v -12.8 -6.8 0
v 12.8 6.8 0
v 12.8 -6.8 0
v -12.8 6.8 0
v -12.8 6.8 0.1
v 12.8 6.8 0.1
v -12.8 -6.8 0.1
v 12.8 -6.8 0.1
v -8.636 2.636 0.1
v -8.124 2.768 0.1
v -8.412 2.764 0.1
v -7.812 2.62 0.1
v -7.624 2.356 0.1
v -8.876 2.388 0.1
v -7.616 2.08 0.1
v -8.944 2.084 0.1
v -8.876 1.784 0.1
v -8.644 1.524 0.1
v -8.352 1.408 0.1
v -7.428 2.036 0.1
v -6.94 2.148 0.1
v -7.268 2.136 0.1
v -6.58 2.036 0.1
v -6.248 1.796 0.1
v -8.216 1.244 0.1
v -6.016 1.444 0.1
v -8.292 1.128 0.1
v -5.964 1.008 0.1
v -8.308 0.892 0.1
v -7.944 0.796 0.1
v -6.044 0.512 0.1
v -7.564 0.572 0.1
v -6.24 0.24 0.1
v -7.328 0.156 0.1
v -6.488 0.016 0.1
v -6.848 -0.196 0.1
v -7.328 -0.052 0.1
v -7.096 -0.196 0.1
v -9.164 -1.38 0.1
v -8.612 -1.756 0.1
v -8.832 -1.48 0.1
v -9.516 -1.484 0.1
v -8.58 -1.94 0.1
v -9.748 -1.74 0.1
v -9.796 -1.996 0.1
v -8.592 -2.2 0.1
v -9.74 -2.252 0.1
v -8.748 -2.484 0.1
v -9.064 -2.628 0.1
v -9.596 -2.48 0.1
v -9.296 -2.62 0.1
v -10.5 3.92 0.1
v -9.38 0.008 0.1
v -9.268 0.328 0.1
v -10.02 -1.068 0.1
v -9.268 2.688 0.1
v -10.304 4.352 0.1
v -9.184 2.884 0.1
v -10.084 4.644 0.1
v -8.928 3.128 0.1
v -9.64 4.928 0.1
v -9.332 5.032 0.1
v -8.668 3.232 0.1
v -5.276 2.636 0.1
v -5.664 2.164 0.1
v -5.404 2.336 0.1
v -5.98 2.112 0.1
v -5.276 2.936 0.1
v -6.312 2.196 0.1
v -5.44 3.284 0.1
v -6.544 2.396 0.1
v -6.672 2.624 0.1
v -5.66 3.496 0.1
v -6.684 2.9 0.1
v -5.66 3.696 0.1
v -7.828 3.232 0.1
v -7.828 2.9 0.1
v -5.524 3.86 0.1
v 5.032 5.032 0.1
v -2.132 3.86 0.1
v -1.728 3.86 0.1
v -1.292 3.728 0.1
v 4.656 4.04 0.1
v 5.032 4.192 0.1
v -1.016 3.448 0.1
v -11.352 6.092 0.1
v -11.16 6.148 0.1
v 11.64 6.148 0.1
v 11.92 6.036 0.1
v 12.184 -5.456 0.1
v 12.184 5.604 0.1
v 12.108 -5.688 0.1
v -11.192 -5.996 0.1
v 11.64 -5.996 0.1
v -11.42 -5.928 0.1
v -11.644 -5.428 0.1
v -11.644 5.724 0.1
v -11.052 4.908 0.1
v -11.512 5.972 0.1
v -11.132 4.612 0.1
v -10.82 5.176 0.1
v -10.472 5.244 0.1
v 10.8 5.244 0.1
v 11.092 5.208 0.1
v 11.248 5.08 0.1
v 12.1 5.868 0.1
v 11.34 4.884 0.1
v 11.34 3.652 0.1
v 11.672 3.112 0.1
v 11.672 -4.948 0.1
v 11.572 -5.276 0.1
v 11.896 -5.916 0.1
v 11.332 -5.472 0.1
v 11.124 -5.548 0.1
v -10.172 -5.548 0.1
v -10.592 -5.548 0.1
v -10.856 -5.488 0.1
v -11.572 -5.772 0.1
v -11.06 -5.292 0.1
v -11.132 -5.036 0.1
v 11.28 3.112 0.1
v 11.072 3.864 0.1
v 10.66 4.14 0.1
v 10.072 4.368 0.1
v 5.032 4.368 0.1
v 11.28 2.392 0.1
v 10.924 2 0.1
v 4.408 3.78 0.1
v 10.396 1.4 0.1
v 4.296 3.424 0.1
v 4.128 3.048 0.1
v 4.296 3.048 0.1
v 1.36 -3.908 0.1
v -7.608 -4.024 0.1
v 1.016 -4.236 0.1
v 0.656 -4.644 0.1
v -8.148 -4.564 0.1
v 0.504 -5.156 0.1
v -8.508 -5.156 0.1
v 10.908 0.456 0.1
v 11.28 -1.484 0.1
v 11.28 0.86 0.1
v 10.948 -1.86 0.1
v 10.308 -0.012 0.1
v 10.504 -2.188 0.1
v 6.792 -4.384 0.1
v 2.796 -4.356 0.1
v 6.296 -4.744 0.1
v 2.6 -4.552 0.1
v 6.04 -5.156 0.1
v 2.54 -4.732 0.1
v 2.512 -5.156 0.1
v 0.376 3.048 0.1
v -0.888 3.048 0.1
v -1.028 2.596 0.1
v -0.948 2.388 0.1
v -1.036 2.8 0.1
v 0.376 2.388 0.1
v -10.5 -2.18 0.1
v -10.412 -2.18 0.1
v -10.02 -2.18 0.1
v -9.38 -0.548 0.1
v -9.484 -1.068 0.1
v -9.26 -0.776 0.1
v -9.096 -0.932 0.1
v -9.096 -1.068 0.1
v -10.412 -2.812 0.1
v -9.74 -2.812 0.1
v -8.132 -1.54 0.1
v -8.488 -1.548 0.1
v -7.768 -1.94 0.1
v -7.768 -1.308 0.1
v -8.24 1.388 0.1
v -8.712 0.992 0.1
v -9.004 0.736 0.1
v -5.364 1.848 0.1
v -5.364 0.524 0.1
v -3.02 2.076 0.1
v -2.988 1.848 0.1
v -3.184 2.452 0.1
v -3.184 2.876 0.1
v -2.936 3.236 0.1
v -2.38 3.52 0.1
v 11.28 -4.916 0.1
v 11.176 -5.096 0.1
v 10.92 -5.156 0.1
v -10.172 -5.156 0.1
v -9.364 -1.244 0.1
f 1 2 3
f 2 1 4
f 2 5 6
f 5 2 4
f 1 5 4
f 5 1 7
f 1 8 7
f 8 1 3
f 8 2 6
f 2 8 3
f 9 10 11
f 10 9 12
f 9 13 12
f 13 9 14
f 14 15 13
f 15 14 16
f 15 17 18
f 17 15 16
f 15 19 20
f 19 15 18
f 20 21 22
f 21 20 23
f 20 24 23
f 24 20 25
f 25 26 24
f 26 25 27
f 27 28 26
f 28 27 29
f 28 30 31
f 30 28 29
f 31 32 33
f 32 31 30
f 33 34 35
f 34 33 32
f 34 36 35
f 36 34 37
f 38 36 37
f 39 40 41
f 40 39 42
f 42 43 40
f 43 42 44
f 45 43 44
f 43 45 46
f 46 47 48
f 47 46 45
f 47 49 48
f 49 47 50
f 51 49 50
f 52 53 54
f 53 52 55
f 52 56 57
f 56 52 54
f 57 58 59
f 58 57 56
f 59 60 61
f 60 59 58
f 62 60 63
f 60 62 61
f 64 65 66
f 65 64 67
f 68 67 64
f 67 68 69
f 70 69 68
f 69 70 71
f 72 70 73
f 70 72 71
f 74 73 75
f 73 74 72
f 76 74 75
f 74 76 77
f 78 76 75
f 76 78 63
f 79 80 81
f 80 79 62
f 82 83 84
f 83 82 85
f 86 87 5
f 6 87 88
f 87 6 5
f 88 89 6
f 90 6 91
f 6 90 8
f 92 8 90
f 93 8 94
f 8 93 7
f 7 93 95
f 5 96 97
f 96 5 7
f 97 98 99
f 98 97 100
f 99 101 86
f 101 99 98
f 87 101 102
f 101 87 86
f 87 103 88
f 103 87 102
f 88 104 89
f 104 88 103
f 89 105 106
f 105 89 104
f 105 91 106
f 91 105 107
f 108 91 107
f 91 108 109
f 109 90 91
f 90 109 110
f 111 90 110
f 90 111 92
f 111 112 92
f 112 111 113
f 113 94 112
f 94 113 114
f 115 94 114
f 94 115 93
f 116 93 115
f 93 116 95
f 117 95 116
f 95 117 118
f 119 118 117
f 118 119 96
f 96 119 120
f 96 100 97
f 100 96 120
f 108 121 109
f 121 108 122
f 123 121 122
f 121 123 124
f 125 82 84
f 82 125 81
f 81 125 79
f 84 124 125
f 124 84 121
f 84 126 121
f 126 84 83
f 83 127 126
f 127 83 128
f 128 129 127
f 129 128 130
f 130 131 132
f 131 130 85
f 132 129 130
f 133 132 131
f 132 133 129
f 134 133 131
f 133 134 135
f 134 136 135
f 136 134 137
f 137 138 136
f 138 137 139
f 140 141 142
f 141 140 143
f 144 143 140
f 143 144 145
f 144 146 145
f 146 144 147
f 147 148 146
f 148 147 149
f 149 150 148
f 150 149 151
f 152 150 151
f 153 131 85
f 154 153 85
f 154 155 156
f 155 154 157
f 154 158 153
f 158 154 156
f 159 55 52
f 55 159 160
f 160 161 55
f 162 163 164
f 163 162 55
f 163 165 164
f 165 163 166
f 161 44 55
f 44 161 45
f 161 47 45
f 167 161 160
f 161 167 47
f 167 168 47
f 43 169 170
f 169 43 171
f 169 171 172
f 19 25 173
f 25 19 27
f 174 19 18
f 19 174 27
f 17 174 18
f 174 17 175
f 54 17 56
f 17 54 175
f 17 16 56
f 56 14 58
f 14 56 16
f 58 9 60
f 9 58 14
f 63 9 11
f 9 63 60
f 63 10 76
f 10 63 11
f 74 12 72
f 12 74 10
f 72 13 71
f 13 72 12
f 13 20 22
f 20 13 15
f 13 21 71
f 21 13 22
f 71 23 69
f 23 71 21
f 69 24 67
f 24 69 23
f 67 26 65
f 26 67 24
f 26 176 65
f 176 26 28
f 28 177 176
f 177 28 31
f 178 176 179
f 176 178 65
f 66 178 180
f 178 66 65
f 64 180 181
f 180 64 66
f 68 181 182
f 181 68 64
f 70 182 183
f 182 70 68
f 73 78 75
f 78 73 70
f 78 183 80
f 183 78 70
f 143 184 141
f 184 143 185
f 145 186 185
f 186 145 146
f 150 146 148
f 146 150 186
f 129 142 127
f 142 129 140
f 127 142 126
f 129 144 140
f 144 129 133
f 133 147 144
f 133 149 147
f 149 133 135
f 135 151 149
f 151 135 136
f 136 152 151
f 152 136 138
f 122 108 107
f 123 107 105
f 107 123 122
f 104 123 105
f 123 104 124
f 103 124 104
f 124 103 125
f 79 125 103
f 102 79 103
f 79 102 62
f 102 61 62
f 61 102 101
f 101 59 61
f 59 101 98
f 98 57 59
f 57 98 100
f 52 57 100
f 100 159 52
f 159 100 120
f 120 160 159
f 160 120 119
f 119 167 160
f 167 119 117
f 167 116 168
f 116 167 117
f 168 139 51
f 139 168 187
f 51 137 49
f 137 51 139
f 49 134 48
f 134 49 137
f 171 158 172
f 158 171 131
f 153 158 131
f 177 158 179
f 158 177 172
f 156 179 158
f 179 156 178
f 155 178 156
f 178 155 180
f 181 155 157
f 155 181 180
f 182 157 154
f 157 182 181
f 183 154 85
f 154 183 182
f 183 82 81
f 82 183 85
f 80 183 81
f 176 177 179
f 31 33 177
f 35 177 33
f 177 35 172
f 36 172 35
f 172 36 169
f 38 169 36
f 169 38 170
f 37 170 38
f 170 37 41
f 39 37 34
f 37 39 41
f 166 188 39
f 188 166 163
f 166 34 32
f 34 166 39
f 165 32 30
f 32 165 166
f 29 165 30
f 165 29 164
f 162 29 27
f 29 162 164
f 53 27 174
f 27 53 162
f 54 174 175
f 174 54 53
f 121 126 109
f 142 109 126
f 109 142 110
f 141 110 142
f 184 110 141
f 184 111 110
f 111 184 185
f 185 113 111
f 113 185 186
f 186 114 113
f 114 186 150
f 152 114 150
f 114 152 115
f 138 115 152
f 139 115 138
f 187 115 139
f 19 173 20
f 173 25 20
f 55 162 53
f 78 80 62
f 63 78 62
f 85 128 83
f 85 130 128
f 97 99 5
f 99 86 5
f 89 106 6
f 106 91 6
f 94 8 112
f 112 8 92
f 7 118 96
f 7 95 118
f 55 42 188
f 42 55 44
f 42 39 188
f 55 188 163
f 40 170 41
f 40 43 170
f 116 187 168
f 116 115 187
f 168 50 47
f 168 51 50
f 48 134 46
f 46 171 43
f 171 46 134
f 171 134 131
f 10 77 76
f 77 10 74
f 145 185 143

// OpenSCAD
// file: ../p/box5-12.scad
use <../lib.scad>
function ldraw_lib__box5_12() = [
// 0 Box with 5 Faces without Any Edges
// 0 Name: box5-12.dat
// 0 Author: Chris Dee [cwdee]
// 0 !LDRAW_ORG Primitive UPDATE 2009-02
// 0 !LICENSE Licensed under CC BY 2.0 and CC BY 4.0 : see CAreadme.txt
// 
// 0 BFC CERTIFY CCW
  [0,"BFC","CERTIFY"],
  [0,"BFC","CCW"],
// 
// 0 !HISTORY 2009-09-03 [PTadmin] Official Update 2009-02
// 
// 
// 4 16 1 1 1 1 1 -1 -1 1 -1 -1 1 1
  [4,16,1,1,1,1,1,-1,-1,1,-1,-1,1,1],
// 4 16 -1 0 1 1 0 1 1 1 1 -1 1 1
  [4,16,-1,0,1,1,0,1,1,1,1,-1,1,1],
// 4 16 -1 0 -1 -1 0 1 -1 1 1 -1 1 -1
  [4,16,-1,0,-1,-1,0,1,-1,1,1,-1,1,-1],
// 4 16 1 0 -1 -1 0 -1 -1 1 -1 1 1 -1
  [4,16,1,0,-1,-1,0,-1,-1,1,-1,1,1,-1],
// 4 16 1 0 1 1 0 -1 1 1 -1 1 1 1
  [4,16,1,0,1,1,0,-1,1,1,-1,1,1,1],
// 0
];
makepoly(ldraw_lib__box5_12(), line=0.2);
// main file
use <../lib.scad>
use <../p/box5-12.scad>
function ldraw_lib__168315e() = [
// 0 Sticker  1.7 x  3.2 Technic Supercar Mirror
// 0 Name: 168315e.dat
// 0 Author: Imre Papp [ampi]
// 0 !LDRAW_ORG Part UPDATE 2012-03
// 0 !LICENSE Licensed under CC BY 2.0 and CC BY 4.0 : see CAreadme.txt
// 
// 0 BFC CERTIFY CW
  [0,"BFC","CERTIFY"],
  [0,"BFC","CW"],
// 
// 0 !HISTORY 2005-12-28 [PTadmin] Official Update 2005-01
// 0 !HISTORY 2007-05-05 [PTadmin] Header formatted for Contributor Agreement
// 0 !HISTORY 2008-07-01 [PTadmin] Official Update 2008-01
// 0 !HISTORY 2012-01-08 [cwdee] Renamed from 168135e, add dimensions
// 0 !HISTORY 2012-11-01 [MagFors] Closed small gaps
// 0 !HISTORY 2012-12-28 [PTadmin] Official Update 2012-03
// 
// 
// 1 0 0 -0.25 0 32 0 0 0 0.25 0 0 0 17 box5-12.dat
  [1,0,0,-0.25,0,32,0,0,0,0.25,0,0,0,17, ldraw_lib__box5_12()],
// 0 // sticker pattern
// 4 0 -21.03 -0.25 6.91 -20.31 -0.25 6.92 -19.53 -0.25 6.55 -21.59 -0.25 6.59
  [4,0,-21.03,-0.25,6.91,-20.31,-0.25,6.92,-19.53,-0.25,6.55,-21.59,-0.25,6.59],
// 4 0 -21.59 -0.25 6.59 -19.53 -0.25 6.55 -19.06 -0.25 5.89 -22.19 -0.25 5.97
  [4,0,-21.59,-0.25,6.59,-19.53,-0.25,6.55,-19.06,-0.25,5.89,-22.19,-0.25,5.97],
// 4 0 -22.19 -0.25 5.97 -19.06 -0.25 5.89 -19.04 -0.25 5.2 -22.36 -0.25 5.21
  [4,0,-22.19,-0.25,5.97,-19.06,-0.25,5.89,-19.04,-0.25,5.2,-22.36,-0.25,5.21],
// 4 0 -22.36 -0.25 5.21 -19.04 -0.25 5.2 -21.61 -0.25 3.81 -22.19 -0.25 4.46
  [4,0,-22.36,-0.25,5.21,-19.04,-0.25,5.2,-21.61,-0.25,3.81,-22.19,-0.25,4.46],
// 4 0 -21.61 -0.25 3.81 -19.04 -0.25 5.2 -18.57 -0.25 5.09 -20.88 -0.25 3.52
  [4,0,-21.61,-0.25,3.81,-19.04,-0.25,5.2,-18.57,-0.25,5.09,-20.88,-0.25,3.52],
// 4 0 -18.57 -0.25 5.09 -18.17 -0.25 5.34 -17.35 -0.25 5.37 -16.45 -0.25 5.09
  [4,0,-18.57,-0.25,5.09,-18.17,-0.25,5.34,-17.35,-0.25,5.37,-16.45,-0.25,5.09],
// 4 0 -18.57 -0.25 5.09 -16.45 -0.25 5.09 -15.62 -0.25 4.49 -20.54 -0.25 3.11
  [4,0,-18.57,-0.25,5.09,-16.45,-0.25,5.09,-15.62,-0.25,4.49,-20.54,-0.25,3.11],
// 4 0 -20.54 -0.25 3.11 -15.62 -0.25 4.49 -15.04 -0.25 3.61 -20.73 -0.25 2.82
  [4,0,-20.54,-0.25,3.11,-15.62,-0.25,4.49,-15.04,-0.25,3.61,-20.73,-0.25,2.82],
// 4 0 -20.73 -0.25 2.82 -15.04 -0.25 3.61 -14.91 -0.25 2.52 -20.77 -0.25 2.23
  [4,0,-20.73,-0.25,2.82,-15.04,-0.25,3.61,-14.91,-0.25,2.52,-20.77,-0.25,2.23],
// 4 0 -20.77 -0.25 2.23 -14.91 -0.25 2.52 -15.11 -0.25 1.28 -19.86 -0.25 1.99
  [4,0,-20.77,-0.25,2.23,-14.91,-0.25,2.52,-15.11,-0.25,1.28,-19.86,-0.25,1.99],
// 4 0 -19.86 -0.25 1.99 -15.11 -0.25 1.28 -15.6 -0.25 0.6 -18.91 -0.25 1.43
  [4,0,-19.86,-0.25,1.99,-15.11,-0.25,1.28,-15.6,-0.25,0.6,-18.91,-0.25,1.43],
// 4 0 -18.91 -0.25 1.43 -15.6 -0.25 0.6 -16.22 -0.25 0.04 -18.32 -0.25 0.39
  [4,0,-18.91,-0.25,1.43,-15.6,-0.25,0.6,-16.22,-0.25,0.04,-18.32,-0.25,0.39],
// 4 0 -18.32 -0.25 -0.13 -18.32 -0.25 0.39 -16.22 -0.25 0.04 -17.12 -0.25 -0.49
  [4,0,-18.32,-0.25,-0.13,-18.32,-0.25,0.39,-16.22,-0.25,0.04,-17.12,-0.25,-0.49],
// 3 0 -18.32 -0.25 -0.13 -17.12 -0.25 -0.49 -17.74 -0.25 -0.49
  [3,0,-18.32,-0.25,-0.13,-17.12,-0.25,-0.49,-17.74,-0.25,-0.49],
// 4 0 -22.91 -0.25 -3.45 -22.08 -0.25 -3.7 -21.53 -0.25 -4.39 -23.79 -0.25 -3.71
  [4,0,-22.91,-0.25,-3.45,-22.08,-0.25,-3.7,-21.53,-0.25,-4.39,-23.79,-0.25,-3.71],
// 4 0 -23.79 -0.25 -3.71 -21.53 -0.25 -4.39 -21.45 -0.25 -4.85 -24.37 -0.25 -4.35
  [4,0,-23.79,-0.25,-3.71,-21.53,-0.25,-4.39,-21.45,-0.25,-4.85,-24.37,-0.25,-4.35],
// 4 0 -24.37 -0.25 -4.35 -21.45 -0.25 -4.85 -21.48 -0.25 -5.5 -24.49 -0.25 -4.99
  [4,0,-24.37,-0.25,-4.35,-21.45,-0.25,-4.85,-21.48,-0.25,-5.5,-24.49,-0.25,-4.99],
// 4 0 -24.49 -0.25 -4.99 -21.48 -0.25 -5.5 -21.87 -0.25 -6.21 -24.35 -0.25 -5.63
  [4,0,-24.49,-0.25,-4.99,-21.48,-0.25,-5.5,-21.87,-0.25,-6.21,-24.35,-0.25,-5.63],
// 4 0 -23.99 -0.25 -6.2 -24.35 -0.25 -5.63 -21.87 -0.25 -6.21 -22.66 -0.25 -6.57
  [4,0,-23.99,-0.25,-6.2,-24.35,-0.25,-5.63,-21.87,-0.25,-6.21,-22.66,-0.25,-6.57],
// 3 0 -23.99 -0.25 -6.2 -22.66 -0.25 -6.57 -23.24 -0.25 -6.55
  [3,0,-23.99,-0.25,-6.2,-22.66,-0.25,-6.57,-23.24,-0.25,-6.55],
// 4 0 -26.25 -0.25 9.8 -23.17 -0.25 0.82 -23.45 -0.25 0.02 -25.05 -0.25 -2.67
  [4,0,-26.25,-0.25,9.8,-23.17,-0.25,0.82,-23.45,-0.25,0.02,-25.05,-0.25,-2.67],
// 4 0 -26.25 -0.25 9.8 -25.76 -0.25 10.88 -23.17 -0.25 6.72 -23.17 -0.25 0.82
  [4,0,-26.25,-0.25,9.8,-25.76,-0.25,10.88,-23.17,-0.25,6.72,-23.17,-0.25,0.82],
// 4 0 -25.76 -0.25 10.88 -25.21 -0.25 11.61 -22.96 -0.25 7.21 -23.17 -0.25 6.72
  [4,0,-25.76,-0.25,10.88,-25.21,-0.25,11.61,-22.96,-0.25,7.21,-23.17,-0.25,6.72],
// 4 0 -25.21 -0.25 11.61 -24.1 -0.25 12.32 -22.32 -0.25 7.82 -22.96 -0.25 7.21
  [4,0,-25.21,-0.25,11.61,-24.1,-0.25,12.32,-22.32,-0.25,7.82,-22.96,-0.25,7.21],
// 4 0 -24.1 -0.25 12.32 -23.33 -0.25 12.58 -21.67 -0.25 8.08 -22.32 -0.25 7.82
  [4,0,-24.1,-0.25,12.32,-23.33,-0.25,12.58,-21.67,-0.25,8.08,-22.32,-0.25,7.82],
// 4 0 -14.95 -0.25 5.28 -13.19 -0.25 6.59 -13.51 -0.25 5.84 -14.16 -0.25 5.41
  [4,0,-14.95,-0.25,5.28,-13.19,-0.25,6.59,-13.51,-0.25,5.84,-14.16,-0.25,5.41],
// 4 0 -15.78 -0.25 5.49 -13.19 -0.25 7.34 -13.19 -0.25 6.59 -14.95 -0.25 5.28
  [4,0,-15.78,-0.25,5.49,-13.19,-0.25,7.34,-13.19,-0.25,6.59,-14.95,-0.25,5.28],
// 4 0 -16.36 -0.25 5.99 -13.6 -0.25 8.21 -13.19 -0.25 7.34 -15.78 -0.25 5.49
  [4,0,-16.36,-0.25,5.99,-13.6,-0.25,8.21,-13.19,-0.25,7.34,-15.78,-0.25,5.49],
// 4 0 -16.68 -0.25 6.56 -14.15 -0.25 8.74 -13.6 -0.25 8.21 -16.36 -0.25 5.99
  [4,0,-16.68,-0.25,6.56,-14.15,-0.25,8.74,-13.6,-0.25,8.21,-16.36,-0.25,5.99],
// 4 0 -16.71 -0.25 7.25 -14.15 -0.25 9.24 -14.15 -0.25 8.74 -16.68 -0.25 6.56
  [4,0,-16.71,-0.25,7.25,-14.15,-0.25,9.24,-14.15,-0.25,8.74,-16.68,-0.25,6.56],
// 4 0 -19.57 -0.25 8.08 -14.15 -0.25 9.24 -16.71 -0.25 7.25 -19.57 -0.25 7.25
  [4,0,-19.57,-0.25,8.08,-14.15,-0.25,9.24,-16.71,-0.25,7.25,-19.57,-0.25,7.25],
// 4 0 -21.67 -0.25 8.08 -13.81 -0.25 9.65 -14.15 -0.25 9.24 -19.57 -0.25 8.08
  [4,0,-21.67,-0.25,8.08,-13.81,-0.25,9.65,-14.15,-0.25,9.24,-19.57,-0.25,8.08],
// 4 0 -23.33 -0.25 12.58 12.58 -0.25 12.58 -4.32 -0.25 9.65 -5.33 -0.25 9.65
  [4,0,-23.33,-0.25,12.58,12.58,-0.25,12.58,-4.32,-0.25,9.65,-5.33,-0.25,9.65],
// 4 0 -3.23 -0.25 9.32 12.58 -0.25 10.48 11.64 -0.25 10.1 -2.54 -0.25 8.62
  [4,0,-3.23,-0.25,9.32,12.58,-0.25,10.48,11.64,-0.25,10.1,-2.54,-0.25,8.62],
// 3 0 -32 -0.25 17 -27.9 -0.25 15.37 -28.38 -0.25 15.23
  [3,0,-32,-0.25,17,-27.9,-0.25,15.37,-28.38,-0.25,15.23],
// 4 0 -32 -0.25 17 32 -0.25 17 29.1 -0.25 15.37 -27.9 -0.25 15.37
  [4,0,-32,-0.25,17,32,-0.25,17,29.1,-0.25,15.37,-27.9,-0.25,15.37],
// 3 0 32 -0.25 17 29.8 -0.25 15.09 29.1 -0.25 15.37
  [3,0,32,-0.25,17,29.8,-0.25,15.09,29.1,-0.25,15.37],
// 4 0 30.46 -0.25 14.01 32 -0.25 17 32 -0.25 -17 30.46 -0.25 -13.64
  [4,0,30.46,-0.25,14.01,32,-0.25,17,32,-0.25,-17,30.46,-0.25,-13.64],
// 3 0 30.46 -0.25 -13.64 32 -0.25 -17 30.27 -0.25 -14.22
  [3,0,30.46,-0.25,-13.64,32,-0.25,-17,30.27,-0.25,-14.22],
// 4 0 32 -0.25 -17 -32 -0.25 -17 -27.98 -0.25 -14.99 29.1 -0.25 -14.99
  [4,0,32,-0.25,-17,-32,-0.25,-17,-27.98,-0.25,-14.99,29.1,-0.25,-14.99],
// 3 0 -28.55 -0.25 -14.82 -27.98 -0.25 -14.99 -32 -0.25 -17
  [3,0,-28.55,-0.25,-14.82,-27.98,-0.25,-14.99,-32,-0.25,-17],
// 4 0 -32 -0.25 -17 -32 -0.25 17 -29.11 -0.25 14.31 -29.11 -0.25 -13.57
  [4,0,-32,-0.25,-17,-32,-0.25,17,-29.11,-0.25,14.31,-29.11,-0.25,-13.57],
// 4 7 -29.11 -0.25 14.31 -28.78 -0.25 14.93 -27.63 -0.25 12.27 -27.83 -0.25 11.53
  [4,7,-29.11,-0.25,14.31,-28.78,-0.25,14.93,-27.63,-0.25,12.27,-27.83,-0.25,11.53],
// 4 7 -28.78 -0.25 14.93 -28.38 -0.25 15.23 -27.05 -0.25 12.94 -27.63 -0.25 12.27
  [4,7,-28.78,-0.25,14.93,-28.38,-0.25,15.23,-27.05,-0.25,12.94,-27.63,-0.25,12.27],
// 4 7 -28.38 -0.25 15.23 -27.9 -0.25 15.37 -26.18 -0.25 13.11 -27.05 -0.25 12.94
  [4,7,-28.38,-0.25,15.23,-27.9,-0.25,15.37,-26.18,-0.25,13.11,-27.05,-0.25,12.94],
// 4 7 -27.9 -0.25 15.37 29.1 -0.25 15.37 27 -0.25 13.11 -26.18 -0.25 13.11
  [4,7,-27.9,-0.25,15.37,29.1,-0.25,15.37,27,-0.25,13.11,-26.18,-0.25,13.11],
// 4 7 27 -0.25 13.11 29.1 -0.25 15.37 29.8 -0.25 15.09 27.73 -0.25 13.02
  [4,7,27,-0.25,13.11,29.1,-0.25,15.37,29.8,-0.25,15.09,27.73,-0.25,13.02],
// 4 7 27.73 -0.25 13.02 29.8 -0.25 15.09 30.25 -0.25 14.67 28.12 -0.25 12.7
  [4,7,27.73,-0.25,13.02,29.8,-0.25,15.09,30.25,-0.25,14.67,28.12,-0.25,12.7],
// 4 7 28.12 -0.25 12.7 30.25 -0.25 14.67 30.46 -0.25 14.01 28.35 -0.25 12.21
  [4,7,28.12,-0.25,12.7,30.25,-0.25,14.67,30.46,-0.25,14.01,28.35,-0.25,12.21],
// 4 7 28.35 -0.25 12.21 30.46 -0.25 14.01 29.18 -0.25 7.78 28.35 -0.25 9.13
  [4,7,28.35,-0.25,12.21,30.46,-0.25,14.01,29.18,-0.25,7.78,28.35,-0.25,9.13],
// 4 7 29.18 -0.25 7.78 30.46 -0.25 14.01 30.46 -0.25 -13.64 29.18 -0.25 -12.37
  [4,7,29.18,-0.25,7.78,30.46,-0.25,14.01,30.46,-0.25,-13.64,29.18,-0.25,-12.37],
// 4 7 28.93 -0.25 -13.19 29.18 -0.25 -12.37 30.46 -0.25 -13.64 30.27 -0.25 -14.22
  [4,7,28.93,-0.25,-13.19,29.18,-0.25,-12.37,30.46,-0.25,-13.64,30.27,-0.25,-14.22],
// 4 7 28.93 -0.25 -13.19 30.27 -0.25 -14.22 29.74 -0.25 -14.79 28.33 -0.25 -13.68
  [4,7,28.93,-0.25,-13.19,30.27,-0.25,-14.22,29.74,-0.25,-14.79,28.33,-0.25,-13.68],
// 4 7 27.81 -0.25 -13.87 28.33 -0.25 -13.68 29.74 -0.25 -14.79 29.1 -0.25 -14.99
  [4,7,27.81,-0.25,-13.87,28.33,-0.25,-13.68,29.74,-0.25,-14.79,29.1,-0.25,-14.99],
// 4 7 29.1 -0.25 -14.99 -27.98 -0.25 -14.99 -25.43 -0.25 -13.87 27.81 -0.25 -13.87
  [4,7,29.1,-0.25,-14.99,-27.98,-0.25,-14.99,-25.43,-0.25,-13.87,27.81,-0.25,-13.87],
// 4 7 -28.55 -0.25 -14.82 -26.48 -0.25 -13.87 -25.43 -0.25 -13.87 -27.98 -0.25 -14.99
  [4,7,-28.55,-0.25,-14.82,-26.48,-0.25,-13.87,-25.43,-0.25,-13.87,-27.98,-0.25,-14.99],
// 4 7 -28.93 -0.25 -14.43 -27.14 -0.25 -13.72 -26.48 -0.25 -13.87 -28.55 -0.25 -14.82
  [4,7,-28.93,-0.25,-14.43,-27.14,-0.25,-13.72,-26.48,-0.25,-13.87,-28.55,-0.25,-14.82],
// 4 7 -29.11 -0.25 -13.57 -27.65 -0.25 -13.23 -27.14 -0.25 -13.72 -28.93 -0.25 -14.43
  [4,7,-29.11,-0.25,-13.57,-27.65,-0.25,-13.23,-27.14,-0.25,-13.72,-28.93,-0.25,-14.43],
// 3 7 -27.83 -0.25 -12.59 -27.65 -0.25 -13.23 -29.11 -0.25 -13.57
  [3,7,-27.83,-0.25,-12.59,-27.65,-0.25,-13.23,-29.11,-0.25,-13.57],
// 4 7 -29.11 -0.25 14.31 -27.83 -0.25 11.53 -27.83 -0.25 -12.59 -29.11 -0.25 -13.57
  [4,7,-29.11,-0.25,14.31,-27.83,-0.25,11.53,-27.83,-0.25,-12.59,-29.11,-0.25,-13.57],
// 4 7 27.68 -0.25 9.66 28.35 -0.25 9.13 29.18 -0.25 7.78 28.2 -0.25 7.78
  [4,7,27.68,-0.25,9.66,28.35,-0.25,9.13,29.18,-0.25,7.78,28.2,-0.25,7.78],
// 4 7 25.18 -0.25 10.92 26.65 -0.25 10.35 27.68 -0.25 9.66 28.2 -0.25 7.78
  [4,7,25.18,-0.25,10.92,26.65,-0.25,10.35,27.68,-0.25,9.66,28.2,-0.25,7.78],
// 4 0 12.58 -0.25 10.92 12.58 -0.25 10.48 -3.23 -0.25 9.32 -4.32 -0.25 9.65
  [4,0,12.58,-0.25,10.92,12.58,-0.25,10.48,-3.23,-0.25,9.32,-4.32,-0.25,9.65],
// 3 0 12.58 -0.25 12.58 12.58 -0.25 10.92 -4.32 -0.25 9.65
  [3,0,12.58,-0.25,12.58,12.58,-0.25,10.92,-4.32,-0.25,9.65],
// 4 7 12.58 -0.25 10.48 12.58 -0.25 10.92 25.18 -0.25 10.92 28.2 -0.25 7.78
  [4,7,12.58,-0.25,10.48,12.58,-0.25,10.92,25.18,-0.25,10.92,28.2,-0.25,7.78],
// 4 7 12.58 -0.25 10.48 28.2 -0.25 7.78 28.2 -0.25 5.98 11.64 -0.25 10.1
  [4,7,12.58,-0.25,10.48,28.2,-0.25,7.78,28.2,-0.25,5.98,11.64,-0.25,10.1],
// 4 7 11.64 -0.25 10.1 28.2 -0.25 5.98 27.31 -0.25 5 11.02 -0.25 9.45
  [4,7,11.64,-0.25,10.1,28.2,-0.25,5.98,27.31,-0.25,5,11.02,-0.25,9.45],
// 4 7 11.02 -0.25 9.45 27.31 -0.25 5 25.99 -0.25 3.5 10.74 -0.25 8.56
  [4,7,11.02,-0.25,9.45,27.31,-0.25,5,25.99,-0.25,3.5,10.74,-0.25,8.56],
// 4 0 10.74 -0.25 8.56 10.74 -0.25 7.62 10.32 -0.25 7.62 -2.54 -0.25 8.62
  [4,0,10.74,-0.25,8.56,10.74,-0.25,7.62,10.32,-0.25,7.62,-2.54,-0.25,8.62],
// 3 7 10.74 -0.25 8.56 25.99 -0.25 3.5 10.74 -0.25 7.62
  [3,7,10.74,-0.25,8.56,25.99,-0.25,3.5,10.74,-0.25,7.62],
// 4 7 10.32 -0.25 7.62 10.74 -0.25 7.62 25.99 -0.25 3.5 3.4 -0.25 -9.77
  [4,7,10.32,-0.25,7.62,10.74,-0.25,7.62,25.99,-0.25,3.5,3.4,-0.25,-9.77],
// 4 7 -19.02 -0.25 -10.06 10.32 -0.25 7.62 3.4 -0.25 -9.77 2.54 -0.25 -10.59
  [4,7,-19.02,-0.25,-10.06,10.32,-0.25,7.62,3.4,-0.25,-9.77,2.54,-0.25,-10.59],
// 4 7 -19.02 -0.25 -10.06 2.54 -0.25 -10.59 1.64 -0.25 -11.61 -20.37 -0.25 -11.41
  [4,7,-19.02,-0.25,-10.06,2.54,-0.25,-10.59,1.64,-0.25,-11.61,-20.37,-0.25,-11.41],
// 4 7 -20.37 -0.25 -11.41 1.64 -0.25 -11.61 1.26 -0.25 -12.89 -21.27 -0.25 -12.89
  [4,7,-20.37,-0.25,-11.41,1.64,-0.25,-11.61,1.26,-0.25,-12.89,-21.27,-0.25,-12.89],
// 4 7 27.27 -0.25 1.14 28.2 -0.25 2.15 28.2 -0.25 -3.71 27.37 -0.25 -4.65
  [4,7,27.27,-0.25,1.14,28.2,-0.25,2.15,28.2,-0.25,-3.71,27.37,-0.25,-4.65],
// 4 7 25.77 -0.25 -0.03 27.27 -0.25 1.14 27.37 -0.25 -4.65 26.26 -0.25 -5.47
  [4,7,25.77,-0.25,-0.03,27.27,-0.25,1.14,27.37,-0.25,-4.65,26.26,-0.25,-5.47],
// 4 7 6.99 -0.25 -10.89 25.77 -0.25 -0.03 26.26 -0.25 -5.47 16.98 -0.25 -10.96
  [4,7,6.99,-0.25,-10.89,25.77,-0.25,-0.03,26.26,-0.25,-5.47,16.98,-0.25,-10.96],
// 4 7 6.99 -0.25 -10.89 16.98 -0.25 -10.96 15.74 -0.25 -11.86 6.5 -0.25 -11.38
  [4,7,6.99,-0.25,-10.89,16.98,-0.25,-10.96,15.74,-0.25,-11.86,6.5,-0.25,-11.38],
// 4 7 6.35 -0.25 -11.83 6.5 -0.25 -11.38 15.74 -0.25 -11.86 15.1 -0.25 -12.89
  [4,7,6.35,-0.25,-11.83,6.5,-0.25,-11.38,15.74,-0.25,-11.86,15.1,-0.25,-12.89],
// 3 7 6.35 -0.25 -11.83 15.1 -0.25 -12.89 6.28 -0.25 -12.89
  [3,7,6.35,-0.25,-11.83,15.1,-0.25,-12.89,6.28,-0.25,-12.89],
// 3 0 -2.54 -0.25 8.62 10.32 -0.25 7.62 0.94 -0.25 7.62
  [3,0,-2.54,-0.25,8.62,10.32,-0.25,7.62,0.94,-0.25,7.62],
// 3 0 -2.54 -0.25 8.62 0.94 -0.25 7.62 -2.22 -0.25 7.62
  [3,0,-2.54,-0.25,8.62,0.94,-0.25,7.62,-2.22,-0.25,7.62],
// 4 7 -2.59 -0.25 7 -2.22 -0.25 7.62 -2.37 -0.25 5.97 -2.57 -0.25 6.49
  [4,7,-2.59,-0.25,7,-2.22,-0.25,7.62,-2.37,-0.25,5.97,-2.57,-0.25,6.49],
// 4 7 -2.22 -0.25 7.62 0.94 -0.25 7.62 0.94 -0.25 5.97 -2.37 -0.25 5.97
  [4,7,-2.22,-0.25,7.62,0.94,-0.25,7.62,0.94,-0.25,5.97,-2.37,-0.25,5.97],
// 4 0 -26.25 -0.25 9.8 -25.05 -0.25 -2.67 -26.03 -0.25 -5.45 -26.25 -0.25 -5.45
  [4,0,-26.25,-0.25,9.8,-25.05,-0.25,-2.67,-26.03,-0.25,-5.45,-26.25,-0.25,-5.45],
// 3 0 -25.05 -0.25 -2.67 -25.05 -0.25 -5.45 -26.03 -0.25 -5.45
  [3,0,-25.05,-0.25,-2.67,-25.05,-0.25,-5.45,-26.03,-0.25,-5.45],
// 4 0 -23.15 -0.25 -1.94 -23.71 -0.25 -2.67 -25.05 -0.25 -2.67 -23.45 -0.25 -1.37
  [4,0,-23.15,-0.25,-1.94,-23.71,-0.25,-2.67,-25.05,-0.25,-2.67,-23.45,-0.25,-1.37],
// 4 0 -23.71 -0.25 -2.67 -23.15 -0.25 -1.94 -22.74 -0.25 -2.33 -22.74 -0.25 -2.67
  [4,0,-23.71,-0.25,-2.67,-23.15,-0.25,-1.94,-22.74,-0.25,-2.33,-22.74,-0.25,-2.67],
// 4 7 -25.05 -0.25 -2.67 -24.37 -0.25 -4.35 -24.49 -0.25 -4.99 -25.05 -0.25 -5.45
  [4,7,-25.05,-0.25,-2.67,-24.37,-0.25,-4.35,-24.49,-0.25,-4.99,-25.05,-0.25,-5.45],
// 3 7 -24.49 -0.25 -4.99 -24.35 -0.25 -5.63 -25.05 -0.25 -5.45
  [3,7,-24.49,-0.25,-4.99,-24.35,-0.25,-5.63,-25.05,-0.25,-5.45],
// 4 7 -26.03 -0.25 -5.45 -25.05 -0.25 -5.45 -24.35 -0.25 -5.63 -26.03 -0.25 -7.03
  [4,7,-26.03,-0.25,-5.45,-25.05,-0.25,-5.45,-24.35,-0.25,-5.63,-26.03,-0.25,-7.03],
// 3 7 -24.35 -0.25 -5.63 -24.35 -0.25 -7.03 -26.03 -0.25 -7.03
  [3,7,-24.35,-0.25,-5.63,-24.35,-0.25,-7.03,-26.03,-0.25,-7.03],
// 4 7 -21.22 -0.25 -3.87 -20.33 -0.25 -3.85 -19.42 -0.25 -4.85 -21.45 -0.25 -4.85
  [4,7,-21.22,-0.25,-3.87,-20.33,-0.25,-3.85,-19.42,-0.25,-4.85,-21.45,-0.25,-4.85],
// 3 7 -19.42 -0.25 -3.27 -19.42 -0.25 -4.85 -20.33 -0.25 -3.85
  [3,7,-19.42,-0.25,-3.27,-19.42,-0.25,-4.85,-20.33,-0.25,-3.85],
// 4 7 -20.73 -0.25 2.82 -20.88 -0.25 3.52 -20.6 -0.25 3.47 -20.54 -0.25 3.11
  [4,7,-20.73,-0.25,2.82,-20.88,-0.25,3.52,-20.6,-0.25,3.47,-20.54,-0.25,3.11],
// 4 7 -21.78 -0.25 2.48 -21.61 -0.25 3.81 -20.88 -0.25 3.52 -20.73 -0.25 2.82
  [4,7,-21.78,-0.25,2.48,-21.61,-0.25,3.81,-20.88,-0.25,3.52,-20.73,-0.25,2.82],
// 4 7 -22.19 -0.25 4.46 -21.61 -0.25 3.81 -21.78 -0.25 2.48 -22.51 -0.25 1.84
  [4,7,-22.19,-0.25,4.46,-21.61,-0.25,3.81,-21.78,-0.25,2.48,-22.51,-0.25,1.84],
// 4 7 -22.19 -0.25 4.46 -22.51 -0.25 1.84 -23.17 -0.25 0.82 -23.17 -0.25 6.72
  [4,7,-22.19,-0.25,4.46,-22.51,-0.25,1.84,-23.17,-0.25,0.82,-23.17,-0.25,6.72],
// 3 7 -23.17 -0.25 6.72 -22.36 -0.25 5.21 -22.19 -0.25 4.46
  [3,7,-23.17,-0.25,6.72,-22.36,-0.25,5.21,-22.19,-0.25,4.46],
// 4 7 -23.17 -0.25 6.72 -22.96 -0.25 7.21 -22.19 -0.25 5.97 -22.36 -0.25 5.21
  [4,7,-23.17,-0.25,6.72,-22.96,-0.25,7.21,-22.19,-0.25,5.97,-22.36,-0.25,5.21],
// 4 7 -22.96 -0.25 7.21 -22.32 -0.25 7.82 -21.59 -0.25 6.59 -22.19 -0.25 5.97
  [4,7,-22.96,-0.25,7.21,-22.32,-0.25,7.82,-21.59,-0.25,6.59,-22.19,-0.25,5.97],
// 4 7 -22.32 -0.25 7.82 -21.67 -0.25 8.08 -21.03 -0.25 6.91 -21.59 -0.25 6.59
  [4,7,-22.32,-0.25,7.82,-21.67,-0.25,8.08,-21.03,-0.25,6.91,-21.59,-0.25,6.59],
// 4 7 -21.67 -0.25 8.08 -19.57 -0.25 8.08 -20.31 -0.25 6.92 -21.03 -0.25 6.91
  [4,7,-21.67,-0.25,8.08,-19.57,-0.25,8.08,-20.31,-0.25,6.92,-21.03,-0.25,6.91],
// 4 7 -20.31 -0.25 6.92 -16.71 -0.25 7.25 -16.68 -0.25 6.56 -19.53 -0.25 6.55
  [4,7,-20.31,-0.25,6.92,-16.71,-0.25,7.25,-16.68,-0.25,6.56,-19.53,-0.25,6.55],
// 4 7 -19.53 -0.25 6.55 -16.68 -0.25 6.56 -16.36 -0.25 5.99 -19.06 -0.25 5.89
  [4,7,-19.53,-0.25,6.55,-16.68,-0.25,6.56,-16.36,-0.25,5.99,-19.06,-0.25,5.89],
// 4 7 -19.06 -0.25 5.89 -18.17 -0.25 5.34 -18.57 -0.25 5.09 -19.04 -0.25 5.2
  [4,7,-19.06,-0.25,5.89,-18.17,-0.25,5.34,-18.57,-0.25,5.09,-19.04,-0.25,5.2],
// 4 7 -19.06 -0.25 5.89 -16.36 -0.25 5.99 -17.35 -0.25 5.37 -18.17 -0.25 5.34
  [4,7,-19.06,-0.25,5.89,-16.36,-0.25,5.99,-17.35,-0.25,5.37,-18.17,-0.25,5.34],
// 4 7 -17.35 -0.25 5.37 -16.36 -0.25 5.99 -15.78 -0.25 5.49 -16.45 -0.25 5.09
  [4,7,-17.35,-0.25,5.37,-16.36,-0.25,5.99,-15.78,-0.25,5.49,-16.45,-0.25,5.09],
// 4 7 -16.45 -0.25 5.09 -15.78 -0.25 5.49 -14.95 -0.25 5.28 -15.62 -0.25 4.49
  [4,7,-16.45,-0.25,5.09,-15.78,-0.25,5.49,-14.95,-0.25,5.28,-15.62,-0.25,4.49],
// 4 7 -14.95 -0.25 5.28 -14.16 -0.25 5.41 -15.04 -0.25 3.61 -15.62 -0.25 4.49
  [4,7,-14.95,-0.25,5.28,-14.16,-0.25,5.41,-15.04,-0.25,3.61,-15.62,-0.25,4.49],
// 4 7 -15.04 -0.25 3.61 -14.16 -0.25 5.41 -13.41 -0.25 4.62 -14.91 -0.25 2.52
  [4,7,-15.04,-0.25,3.61,-14.16,-0.25,5.41,-13.41,-0.25,4.62,-14.91,-0.25,2.52],
// 4 7 -14.91 -0.25 2.52 -13.41 -0.25 4.62 -13.41 -0.25 1.31 -15.11 -0.25 1.28
  [4,7,-14.91,-0.25,2.52,-13.41,-0.25,4.62,-13.41,-0.25,1.31,-15.11,-0.25,1.28],
// 4 7 -14.16 -0.25 5.41 -7.55 -0.25 5.19 -7.47 -0.25 4.62 -13.41 -0.25 4.62
  [4,7,-14.16,-0.25,5.41,-7.55,-0.25,5.19,-7.47,-0.25,4.62,-13.41,-0.25,4.62],
// 4 7 -13.51 -0.25 5.84 -7.96 -0.25 6.13 -7.55 -0.25 5.19 -14.16 -0.25 5.41
  [4,7,-13.51,-0.25,5.84,-7.96,-0.25,6.13,-7.55,-0.25,5.19,-14.16,-0.25,5.41],
// 4 7 -13.19 -0.25 6.59 -7.96 -0.25 7.19 -7.96 -0.25 6.13 -13.51 -0.25 5.84
  [4,7,-13.19,-0.25,6.59,-7.96,-0.25,7.19,-7.96,-0.25,6.13,-13.51,-0.25,5.84],
// 4 7 -13.19 -0.25 7.34 -7.34 -0.25 8.09 -7.96 -0.25 7.19 -13.19 -0.25 6.59
  [4,7,-13.19,-0.25,7.34,-7.34,-0.25,8.09,-7.96,-0.25,7.19,-13.19,-0.25,6.59],
// 4 7 -13.6 -0.25 8.21 -5.95 -0.25 8.8 -7.34 -0.25 8.09 -13.19 -0.25 7.34
  [4,7,-13.6,-0.25,8.21,-5.95,-0.25,8.8,-7.34,-0.25,8.09,-13.19,-0.25,7.34],
// 4 7 -14.15 -0.25 8.74 -14.15 -0.25 9.24 -13.81 -0.25 9.65 -13.6 -0.25 8.21
  [4,7,-14.15,-0.25,8.74,-14.15,-0.25,9.24,-13.81,-0.25,9.65,-13.6,-0.25,8.21],
// 4 7 -13.81 -0.25 9.65 -5.33 -0.25 9.65 -5.95 -0.25 8.8 -13.6 -0.25 8.21
  [4,7,-13.81,-0.25,9.65,-5.33,-0.25,9.65,-5.95,-0.25,8.8,-13.6,-0.25,8.21],
// 4 15 28.2 -0.25 -3.71 28.2 -0.25 -12.29 27.94 -0.25 -12.74 27.37 -0.25 -4.65
  [4,15,28.2,-0.25,-3.71,28.2,-0.25,-12.29,27.94,-0.25,-12.74,27.37,-0.25,-4.65],
// 4 15 16.98 -0.25 -10.96 26.26 -0.25 -5.47 27.94 -0.25 -12.74 27.3 -0.25 -12.89
  [4,15,16.98,-0.25,-10.96,26.26,-0.25,-5.47,27.94,-0.25,-12.74,27.3,-0.25,-12.89],
// 4 15 16.98 -0.25 -10.96 27.3 -0.25 -12.89 15.1 -0.25 -12.89 15.74 -0.25 -11.86
  [4,15,16.98,-0.25,-10.96,27.3,-0.25,-12.89,15.1,-0.25,-12.89,15.74,-0.25,-11.86],
// 4 15 25.99 -0.25 3.5 27.31 -0.25 5 28.2 -0.25 2.15 27.27 -0.25 1.14
  [4,15,25.99,-0.25,3.5,27.31,-0.25,5,28.2,-0.25,2.15,27.27,-0.25,1.14],
// 3 15 28.2 -0.25 5.98 28.2 -0.25 2.15 27.31 -0.25 5
  [3,15,28.2,-0.25,5.98,28.2,-0.25,2.15,27.31,-0.25,5],
// 4 15 25.99 -0.25 3.5 27.27 -0.25 1.14 25.77 -0.25 -0.03 3.4 -0.25 -9.77
  [4,15,25.99,-0.25,3.5,27.27,-0.25,1.14,25.77,-0.25,-0.03,3.4,-0.25,-9.77],
// 3 15 25.77 -0.25 -0.03 6.99 -0.25 -10.89 3.4 -0.25 -9.77
  [3,15,25.77,-0.25,-0.03,6.99,-0.25,-10.89,3.4,-0.25,-9.77],
// 4 15 3.4 -0.25 -9.77 6.99 -0.25 -10.89 6.5 -0.25 -11.38 2.54 -0.25 -10.59
  [4,15,3.4,-0.25,-9.77,6.99,-0.25,-10.89,6.5,-0.25,-11.38,2.54,-0.25,-10.59],
// 4 15 2.54 -0.25 -10.59 6.5 -0.25 -11.38 6.35 -0.25 -11.83 1.64 -0.25 -11.61
  [4,15,2.54,-0.25,-10.59,6.5,-0.25,-11.38,6.35,-0.25,-11.83,1.64,-0.25,-11.61],
// 4 15 1.64 -0.25 -11.61 6.35 -0.25 -11.83 6.28 -0.25 -12.89 1.26 -0.25 -12.89
  [4,15,1.64,-0.25,-11.61,6.35,-0.25,-11.83,6.28,-0.25,-12.89,1.26,-0.25,-12.89],
// 3 15 28.35 -0.25 12.21 28.35 -0.25 9.13 27.68 -0.25 9.66
  [3,15,28.35,-0.25,12.21,28.35,-0.25,9.13,27.68,-0.25,9.66],
// 4 15 26.65 -0.25 10.35 28.12 -0.25 12.7 28.35 -0.25 12.21 27.68 -0.25 9.66
  [4,15,26.65,-0.25,10.35,28.12,-0.25,12.7,28.35,-0.25,12.21,27.68,-0.25,9.66],
// 4 15 25.18 -0.25 10.92 27.73 -0.25 13.02 28.12 -0.25 12.7 26.65 -0.25 10.35
  [4,15,25.18,-0.25,10.92,27.73,-0.25,13.02,28.12,-0.25,12.7,26.65,-0.25,10.35],
// 4 15 27 -0.25 13.11 27.73 -0.25 13.02 25.18 -0.25 10.92 12.58 -0.25 10.92
  [4,15,27,-0.25,13.11,27.73,-0.25,13.02,25.18,-0.25,10.92,12.58,-0.25,10.92],
// 3 15 27 -0.25 13.11 12.58 -0.25 10.92 12.58 -0.25 12.58
  [3,15,27,-0.25,13.11,12.58,-0.25,10.92,12.58,-0.25,12.58],
// 4 15 -23.33 -0.25 12.58 -26.18 -0.25 13.11 27 -0.25 13.11 12.58 -0.25 12.58
  [4,15,-23.33,-0.25,12.58,-26.18,-0.25,13.11,27,-0.25,13.11,12.58,-0.25,12.58],
// 4 15 -27.05 -0.25 12.94 -26.18 -0.25 13.11 -23.33 -0.25 12.58 -24.1 -0.25 12.32
  [4,15,-27.05,-0.25,12.94,-26.18,-0.25,13.11,-23.33,-0.25,12.58,-24.1,-0.25,12.32],
// 4 15 -27.05 -0.25 12.94 -24.1 -0.25 12.32 -25.21 -0.25 11.61 -27.63 -0.25 12.27
  [4,15,-27.05,-0.25,12.94,-24.1,-0.25,12.32,-25.21,-0.25,11.61,-27.63,-0.25,12.27],
// 4 15 -27.63 -0.25 12.27 -25.21 -0.25 11.61 -25.76 -0.25 10.88 -27.83 -0.25 11.53
  [4,15,-27.63,-0.25,12.27,-25.21,-0.25,11.61,-25.76,-0.25,10.88,-27.83,-0.25,11.53],
// 3 15 -27.83 -0.25 11.53 -25.76 -0.25 10.88 -26.25 -0.25 9.8
  [3,15,-27.83,-0.25,11.53,-25.76,-0.25,10.88,-26.25,-0.25,9.8],
// 4 15 -27.83 -0.25 -12.59 -27.83 -0.25 11.53 -26.25 -0.25 9.8 -26.25 -0.25 -5.45
  [4,15,-27.83,-0.25,-12.59,-27.83,-0.25,11.53,-26.25,-0.25,9.8,-26.25,-0.25,-5.45],
// 4 15 -27.83 -0.25 -12.59 -26.25 -0.25 -5.45 -26.03 -0.25 -5.45 -27.65 -0.25 -13.23
  [4,15,-27.83,-0.25,-12.59,-26.25,-0.25,-5.45,-26.03,-0.25,-5.45,-27.65,-0.25,-13.23],
// 4 15 -27.65 -0.25 -13.23 -26.03 -0.25 -5.45 -26.03 -0.25 -7.03 -27.14 -0.25 -13.72
  [4,15,-27.65,-0.25,-13.23,-26.03,-0.25,-5.45,-26.03,-0.25,-7.03,-27.14,-0.25,-13.72],
// 4 15 -26.03 -0.25 -7.03 -24.35 -0.25 -7.03 -26.48 -0.25 -13.87 -27.14 -0.25 -13.72
  [4,15,-26.03,-0.25,-7.03,-24.35,-0.25,-7.03,-26.48,-0.25,-13.87,-27.14,-0.25,-13.72],
// 4 15 -25.43 -0.25 -12.89 -24.35 -0.25 -7.03 -23.24 -0.25 -6.55 -21.27 -0.25 -12.89
  [4,15,-25.43,-0.25,-12.89,-24.35,-0.25,-7.03,-23.24,-0.25,-6.55,-21.27,-0.25,-12.89],
// 4 15 -23.24 -0.25 -6.55 -22.66 -0.25 -6.57 -20.37 -0.25 -11.41 -21.27 -0.25 -12.89
  [4,15,-23.24,-0.25,-6.55,-22.66,-0.25,-6.57,-20.37,-0.25,-11.41,-21.27,-0.25,-12.89],
// 4 15 -22.66 -0.25 -6.57 -21.87 -0.25 -6.21 -19.02 -0.25 -10.06 -20.37 -0.25 -11.41
  [4,15,-22.66,-0.25,-6.57,-21.87,-0.25,-6.21,-19.02,-0.25,-10.06,-20.37,-0.25,-11.41],
// 4 15 -19.42 -0.25 -4.85 -19.42 -0.25 -3.27 0.94 -0.25 5.97 10.32 -0.25 7.62
  [4,15,-19.42,-0.25,-4.85,-19.42,-0.25,-3.27,0.94,-0.25,5.97,10.32,-0.25,7.62],
// 3 15 10.32 -0.25 7.62 0.94 -0.25 5.97 0.94 -0.25 7.62
  [3,15,10.32,-0.25,7.62,0.94,-0.25,5.97,0.94,-0.25,7.62],
// 4 15 -19.42 -0.25 -3.27 -13.41 -0.25 1.31 -7.47 -0.25 4.62 0.94 -0.25 5.97
  [4,15,-19.42,-0.25,-3.27,-13.41,-0.25,1.31,-7.47,-0.25,4.62,0.94,-0.25,5.97],
// 4 15 -7.47 -0.25 4.62 -7.55 -0.25 5.19 -2.37 -0.25 5.97 0.94 -0.25 5.97
  [4,15,-7.47,-0.25,4.62,-7.55,-0.25,5.19,-2.37,-0.25,5.97,0.94,-0.25,5.97],
// 4 15 -7.96 -0.25 6.13 -2.57 -0.25 6.49 -2.37 -0.25 5.97 -7.55 -0.25 5.19
  [4,15,-7.96,-0.25,6.13,-2.57,-0.25,6.49,-2.37,-0.25,5.97,-7.55,-0.25,5.19],
// 4 15 -7.96 -0.25 7.19 -2.59 -0.25 7 -2.57 -0.25 6.49 -7.96 -0.25 6.13
  [4,15,-7.96,-0.25,7.19,-2.59,-0.25,7,-2.57,-0.25,6.49,-7.96,-0.25,6.13],
// 4 15 -7.96 -0.25 7.19 -7.34 -0.25 8.09 -2.22 -0.25 7.62 -2.59 -0.25 7
  [4,15,-7.96,-0.25,7.19,-7.34,-0.25,8.09,-2.22,-0.25,7.62,-2.59,-0.25,7],
// 4 15 -7.34 -0.25 8.09 -5.95 -0.25 8.8 -2.54 -0.25 8.62 -2.22 -0.25 7.62
  [4,15,-7.34,-0.25,8.09,-5.95,-0.25,8.8,-2.54,-0.25,8.62,-2.22,-0.25,7.62],
// 4 15 -5.95 -0.25 8.8 -4.32 -0.25 9.65 -3.23 -0.25 9.32 -2.54 -0.25 8.62
  [4,15,-5.95,-0.25,8.8,-4.32,-0.25,9.65,-3.23,-0.25,9.32,-2.54,-0.25,8.62],
// 3 15 -4.32 -0.25 9.65 -5.95 -0.25 8.8 -5.33 -0.25 9.65
  [3,15,-4.32,-0.25,9.65,-5.95,-0.25,8.8,-5.33,-0.25,9.65],
// 3 15 -7.47 -0.25 4.62 -13.41 -0.25 1.31 -13.41 -0.25 4.62
  [3,15,-7.47,-0.25,4.62,-13.41,-0.25,1.31,-13.41,-0.25,4.62],
// 3 15 -13.41 -0.25 1.31 -15.6 -0.25 0.6 -15.11 -0.25 1.28
  [3,15,-13.41,-0.25,1.31,-15.6,-0.25,0.6,-15.11,-0.25,1.28],
// 4 15 -19.42 -0.25 -3.27 -16.22 -0.25 0.04 -15.6 -0.25 0.6 -13.41 -0.25 1.31
  [4,15,-19.42,-0.25,-3.27,-16.22,-0.25,0.04,-15.6,-0.25,0.6,-13.41,-0.25,1.31],
// 4 15 -20.33 -0.25 -3.85 -17.12 -0.25 -0.49 -16.22 -0.25 0.04 -19.42 -0.25 -3.27
  [4,15,-20.33,-0.25,-3.85,-17.12,-0.25,-0.49,-16.22,-0.25,0.04,-19.42,-0.25,-3.27],
// 4 15 -21.22 -0.25 -3.87 -17.74 -0.25 -0.49 -17.12 -0.25 -0.49 -20.33 -0.25 -3.85
  [4,15,-21.22,-0.25,-3.87,-17.74,-0.25,-0.49,-17.12,-0.25,-0.49,-20.33,-0.25,-3.85],
// 4 15 -22.08 -0.25 -3.7 -18.32 -0.25 -0.13 -17.74 -0.25 -0.49 -21.22 -0.25 -3.87
  [4,15,-22.08,-0.25,-3.7,-18.32,-0.25,-0.13,-17.74,-0.25,-0.49,-21.22,-0.25,-3.87],
// 4 15 -22.91 -0.25 -3.45 -18.32 -0.25 0.39 -18.32 -0.25 -0.13 -22.08 -0.25 -3.7
  [4,15,-22.91,-0.25,-3.45,-18.32,-0.25,0.39,-18.32,-0.25,-0.13,-22.08,-0.25,-3.7],
// 4 15 -23.71 -0.25 -2.67 -22.74 -0.25 -2.67 -22.91 -0.25 -3.45 -23.41 -0.25 -3.11
  [4,15,-23.71,-0.25,-2.67,-22.74,-0.25,-2.67,-22.91,-0.25,-3.45,-23.41,-0.25,-3.11],
// 4 15 -22.91 -0.25 -3.45 -22.74 -0.25 -2.67 -18.91 -0.25 1.43 -18.32 -0.25 0.39
  [4,15,-22.91,-0.25,-3.45,-22.74,-0.25,-2.67,-18.91,-0.25,1.43,-18.32,-0.25,0.39],
// 4 15 -22.74 -0.25 -2.33 -19.86 -0.25 1.99 -18.91 -0.25 1.43 -22.74 -0.25 -2.67
  [4,15,-22.74,-0.25,-2.33,-19.86,-0.25,1.99,-18.91,-0.25,1.43,-22.74,-0.25,-2.67],
// 4 15 -23.15 -0.25 -1.94 -20.77 -0.25 2.23 -19.86 -0.25 1.99 -22.74 -0.25 -2.33
  [4,15,-23.15,-0.25,-1.94,-20.77,-0.25,2.23,-19.86,-0.25,1.99,-22.74,-0.25,-2.33],
// 4 15 -23.45 -0.25 -1.37 -20.73 -0.25 2.82 -20.77 -0.25 2.23 -23.15 -0.25 -1.94
  [4,15,-23.45,-0.25,-1.37,-20.73,-0.25,2.82,-20.77,-0.25,2.23,-23.15,-0.25,-1.94],
// 4 15 -23.45 -0.25 -1.37 -23.45 -0.25 0.02 -21.78 -0.25 2.48 -20.73 -0.25 2.82
  [4,15,-23.45,-0.25,-1.37,-23.45,-0.25,0.02,-21.78,-0.25,2.48,-20.73,-0.25,2.82],
// 4 15 -23.45 -0.25 0.02 -23.17 -0.25 0.82 -22.51 -0.25 1.84 -21.78 -0.25 2.48
  [4,15,-23.45,-0.25,0.02,-23.17,-0.25,0.82,-22.51,-0.25,1.84,-21.78,-0.25,2.48],
// 3 0 29.18 -0.25 7.78 28.2 -0.25 5.98 28.2 -0.25 7.78
  [3,0,29.18,-0.25,7.78,28.2,-0.25,5.98,28.2,-0.25,7.78],
// 4 0 28.2 -0.25 2.15 28.2 -0.25 5.98 29.18 -0.25 7.78 29.18 -0.25 -12.37
  [4,0,28.2,-0.25,2.15,28.2,-0.25,5.98,29.18,-0.25,7.78,29.18,-0.25,-12.37],
// 3 0 28.2 -0.25 2.15 29.18 -0.25 -12.37 28.2 -0.25 -3.71
  [3,0,28.2,-0.25,2.15,29.18,-0.25,-12.37,28.2,-0.25,-3.71],
// 3 0 28.2 -0.25 -3.71 29.18 -0.25 -12.37 28.2 -0.25 -12.29
  [3,0,28.2,-0.25,-3.71,29.18,-0.25,-12.37,28.2,-0.25,-12.29],
// 4 0 27.94 -0.25 -12.74 28.2 -0.25 -12.29 29.18 -0.25 -12.37 28.93 -0.25 -13.19
  [4,0,27.94,-0.25,-12.74,28.2,-0.25,-12.29,29.18,-0.25,-12.37,28.93,-0.25,-13.19],
// 4 0 27.3 -0.25 -12.89 27.94 -0.25 -12.74 28.93 -0.25 -13.19 28.33 -0.25 -13.68
  [4,0,27.3,-0.25,-12.89,27.94,-0.25,-12.74,28.93,-0.25,-13.19,28.33,-0.25,-13.68],
// 4 0 27.3 -0.25 -12.89 28.33 -0.25 -13.68 27.81 -0.25 -13.87 15.1 -0.25 -12.89
  [4,0,27.3,-0.25,-12.89,28.33,-0.25,-13.68,27.81,-0.25,-13.87,15.1,-0.25,-12.89],
// 4 0 6.28 -0.25 -12.89 15.1 -0.25 -12.89 27.81 -0.25 -13.87 -25.43 -0.25 -13.87
  [4,0,6.28,-0.25,-12.89,15.1,-0.25,-12.89,27.81,-0.25,-13.87,-25.43,-0.25,-13.87],
// 3 0 6.28 -0.25 -12.89 -25.43 -0.25 -13.87 1.26 -0.25 -12.89
  [3,0,6.28,-0.25,-12.89,-25.43,-0.25,-13.87,1.26,-0.25,-12.89],
// 3 0 1.26 -0.25 -12.89 -25.43 -0.25 -13.87 -21.27 -0.25 -12.89
  [3,0,1.26,-0.25,-12.89,-25.43,-0.25,-13.87,-21.27,-0.25,-12.89],
// 3 0 -21.27 -0.25 -12.89 -25.43 -0.25 -13.87 -25.43 -0.25 -12.89
  [3,0,-21.27,-0.25,-12.89,-25.43,-0.25,-13.87,-25.43,-0.25,-12.89],
// 3 0 -18.57 -0.25 5.09 -20.6 -0.25 3.47 -20.88 -0.25 3.52
  [3,0,-18.57,-0.25,5.09,-20.6,-0.25,3.47,-20.88,-0.25,3.52],
// 3 0 -18.57 -0.25 5.09 -20.54 -0.25 3.11 -20.6 -0.25 3.47
  [3,0,-18.57,-0.25,5.09,-20.54,-0.25,3.11,-20.6,-0.25,3.47],
// 3 0 -23.45 -0.25 0.02 -23.45 -0.25 -1.37 -25.05 -0.25 -2.67
  [3,0,-23.45,-0.25,0.02,-23.45,-0.25,-1.37,-25.05,-0.25,-2.67],
// 3 0 -23.33 -0.25 12.58 -5.33 -0.25 9.65 -13.81 -0.25 9.65
  [3,0,-23.33,-0.25,12.58,-5.33,-0.25,9.65,-13.81,-0.25,9.65],
// 3 0 -23.33 -0.25 12.58 -13.81 -0.25 9.65 -21.67 -0.25 8.08
  [3,0,-23.33,-0.25,12.58,-13.81,-0.25,9.65,-21.67,-0.25,8.08],
// 3 0 11.64 -0.25 10.1 11.02 -0.25 9.45 -2.54 -0.25 8.62
  [3,0,11.64,-0.25,10.1,11.02,-0.25,9.45,-2.54,-0.25,8.62],
// 3 0 11.02 -0.25 9.45 10.74 -0.25 8.56 -2.54 -0.25 8.62
  [3,0,11.02,-0.25,9.45,10.74,-0.25,8.56,-2.54,-0.25,8.62],
// 3 0 -32 -0.25 17 -28.78 -0.25 14.93 -29.11 -0.25 14.31
  [3,0,-32,-0.25,17,-28.78,-0.25,14.93,-29.11,-0.25,14.31],
// 3 0 -32 -0.25 17 -28.38 -0.25 15.23 -28.78 -0.25 14.93
  [3,0,-32,-0.25,17,-28.38,-0.25,15.23,-28.78,-0.25,14.93],
// 3 0 32 -0.25 17 30.25 -0.25 14.67 29.8 -0.25 15.09
  [3,0,32,-0.25,17,30.25,-0.25,14.67,29.8,-0.25,15.09],
// 3 0 32 -0.25 17 30.46 -0.25 14.01 30.25 -0.25 14.67
  [3,0,32,-0.25,17,30.46,-0.25,14.01,30.25,-0.25,14.67],
// 3 0 29.74 -0.25 -14.79 32 -0.25 -17 29.1 -0.25 -14.99
  [3,0,29.74,-0.25,-14.79,32,-0.25,-17,29.1,-0.25,-14.99],
// 3 0 30.27 -0.25 -14.22 32 -0.25 -17 29.74 -0.25 -14.79
  [3,0,30.27,-0.25,-14.22,32,-0.25,-17,29.74,-0.25,-14.79],
// 3 0 -29.11 -0.25 -13.57 -28.93 -0.25 -14.43 -32 -0.25 -17
  [3,0,-29.11,-0.25,-13.57,-28.93,-0.25,-14.43,-32,-0.25,-17],
// 3 0 -28.93 -0.25 -14.43 -28.55 -0.25 -14.82 -32 -0.25 -17
  [3,0,-28.93,-0.25,-14.43,-28.55,-0.25,-14.82,-32,-0.25,-17],
// 4 7 -23.79 -0.25 -3.71 -24.37 -0.25 -4.35 -25.05 -0.25 -2.67 -23.41 -0.25 -3.11
  [4,7,-23.79,-0.25,-3.71,-24.37,-0.25,-4.35,-25.05,-0.25,-2.67,-23.41,-0.25,-3.11],
// 3 7 -23.41 -0.25 -3.11 -22.91 -0.25 -3.45 -23.79 -0.25 -3.71
  [3,7,-23.41,-0.25,-3.11,-22.91,-0.25,-3.45,-23.79,-0.25,-3.71],
// 3 7 -23.71 -0.25 -2.67 -23.41 -0.25 -3.11 -25.05 -0.25 -2.67
  [3,7,-23.71,-0.25,-2.67,-23.41,-0.25,-3.11,-25.05,-0.25,-2.67],
// 3 7 -22.08 -0.25 -3.7 -21.22 -0.25 -3.87 -21.53 -0.25 -4.39
  [3,7,-22.08,-0.25,-3.7,-21.22,-0.25,-3.87,-21.53,-0.25,-4.39],
// 3 7 -21.22 -0.25 -3.87 -21.45 -0.25 -4.85 -21.53 -0.25 -4.39
  [3,7,-21.22,-0.25,-3.87,-21.45,-0.25,-4.85,-21.53,-0.25,-4.39],
// 3 15 -24.35 -0.25 -7.03 -25.43 -0.25 -12.89 -26.48 -0.25 -13.87
  [3,15,-24.35,-0.25,-7.03,-25.43,-0.25,-12.89,-26.48,-0.25,-13.87],
// 3 15 -25.43 -0.25 -12.89 -25.43 -0.25 -13.87 -26.48 -0.25 -13.87
  [3,15,-25.43,-0.25,-12.89,-25.43,-0.25,-13.87,-26.48,-0.25,-13.87],
// 3 15 -24.35 -0.25 -5.63 -23.99 -0.25 -6.2 -24.35 -0.25 -7.03
  [3,15,-24.35,-0.25,-5.63,-23.99,-0.25,-6.2,-24.35,-0.25,-7.03],
// 3 15 -23.99 -0.25 -6.2 -23.24 -0.25 -6.55 -24.35 -0.25 -7.03
  [3,15,-23.99,-0.25,-6.2,-23.24,-0.25,-6.55,-24.35,-0.25,-7.03],
// 3 15 -21.48 -0.25 -5.5 -19.02 -0.25 -10.06 -21.87 -0.25 -6.21
  [3,15,-21.48,-0.25,-5.5,-19.02,-0.25,-10.06,-21.87,-0.25,-6.21],
// 4 15 -19.02 -0.25 -10.06 -21.48 -0.25 -5.5 -21.45 -0.25 -4.85 -19.42 -0.25 -4.85
  [4,15,-19.02,-0.25,-10.06,-21.48,-0.25,-5.5,-21.45,-0.25,-4.85,-19.42,-0.25,-4.85],
// 3 15 10.32 -0.25 7.62 -19.02 -0.25 -10.06 -19.42 -0.25 -4.85
  [3,15,10.32,-0.25,7.62,-19.02,-0.25,-10.06,-19.42,-0.25,-4.85],
// 3 7 -19.57 -0.25 8.08 -19.57 -0.25 7.25 -20.31 -0.25 6.92
  [3,7,-19.57,-0.25,8.08,-19.57,-0.25,7.25,-20.31,-0.25,6.92],
// 3 7 -16.71 -0.25 7.25 -20.31 -0.25 6.92 -19.57 -0.25 7.25
  [3,7,-16.71,-0.25,7.25,-20.31,-0.25,6.92,-19.57,-0.25,7.25],
// 3 15 27.37 -0.25 -4.65 27.94 -0.25 -12.74 26.26 -0.25 -5.47
  [3,15,27.37,-0.25,-4.65,27.94,-0.25,-12.74,26.26,-0.25,-5.47],
];
makepoly(ldraw_lib__168315e(), line=0.2);
